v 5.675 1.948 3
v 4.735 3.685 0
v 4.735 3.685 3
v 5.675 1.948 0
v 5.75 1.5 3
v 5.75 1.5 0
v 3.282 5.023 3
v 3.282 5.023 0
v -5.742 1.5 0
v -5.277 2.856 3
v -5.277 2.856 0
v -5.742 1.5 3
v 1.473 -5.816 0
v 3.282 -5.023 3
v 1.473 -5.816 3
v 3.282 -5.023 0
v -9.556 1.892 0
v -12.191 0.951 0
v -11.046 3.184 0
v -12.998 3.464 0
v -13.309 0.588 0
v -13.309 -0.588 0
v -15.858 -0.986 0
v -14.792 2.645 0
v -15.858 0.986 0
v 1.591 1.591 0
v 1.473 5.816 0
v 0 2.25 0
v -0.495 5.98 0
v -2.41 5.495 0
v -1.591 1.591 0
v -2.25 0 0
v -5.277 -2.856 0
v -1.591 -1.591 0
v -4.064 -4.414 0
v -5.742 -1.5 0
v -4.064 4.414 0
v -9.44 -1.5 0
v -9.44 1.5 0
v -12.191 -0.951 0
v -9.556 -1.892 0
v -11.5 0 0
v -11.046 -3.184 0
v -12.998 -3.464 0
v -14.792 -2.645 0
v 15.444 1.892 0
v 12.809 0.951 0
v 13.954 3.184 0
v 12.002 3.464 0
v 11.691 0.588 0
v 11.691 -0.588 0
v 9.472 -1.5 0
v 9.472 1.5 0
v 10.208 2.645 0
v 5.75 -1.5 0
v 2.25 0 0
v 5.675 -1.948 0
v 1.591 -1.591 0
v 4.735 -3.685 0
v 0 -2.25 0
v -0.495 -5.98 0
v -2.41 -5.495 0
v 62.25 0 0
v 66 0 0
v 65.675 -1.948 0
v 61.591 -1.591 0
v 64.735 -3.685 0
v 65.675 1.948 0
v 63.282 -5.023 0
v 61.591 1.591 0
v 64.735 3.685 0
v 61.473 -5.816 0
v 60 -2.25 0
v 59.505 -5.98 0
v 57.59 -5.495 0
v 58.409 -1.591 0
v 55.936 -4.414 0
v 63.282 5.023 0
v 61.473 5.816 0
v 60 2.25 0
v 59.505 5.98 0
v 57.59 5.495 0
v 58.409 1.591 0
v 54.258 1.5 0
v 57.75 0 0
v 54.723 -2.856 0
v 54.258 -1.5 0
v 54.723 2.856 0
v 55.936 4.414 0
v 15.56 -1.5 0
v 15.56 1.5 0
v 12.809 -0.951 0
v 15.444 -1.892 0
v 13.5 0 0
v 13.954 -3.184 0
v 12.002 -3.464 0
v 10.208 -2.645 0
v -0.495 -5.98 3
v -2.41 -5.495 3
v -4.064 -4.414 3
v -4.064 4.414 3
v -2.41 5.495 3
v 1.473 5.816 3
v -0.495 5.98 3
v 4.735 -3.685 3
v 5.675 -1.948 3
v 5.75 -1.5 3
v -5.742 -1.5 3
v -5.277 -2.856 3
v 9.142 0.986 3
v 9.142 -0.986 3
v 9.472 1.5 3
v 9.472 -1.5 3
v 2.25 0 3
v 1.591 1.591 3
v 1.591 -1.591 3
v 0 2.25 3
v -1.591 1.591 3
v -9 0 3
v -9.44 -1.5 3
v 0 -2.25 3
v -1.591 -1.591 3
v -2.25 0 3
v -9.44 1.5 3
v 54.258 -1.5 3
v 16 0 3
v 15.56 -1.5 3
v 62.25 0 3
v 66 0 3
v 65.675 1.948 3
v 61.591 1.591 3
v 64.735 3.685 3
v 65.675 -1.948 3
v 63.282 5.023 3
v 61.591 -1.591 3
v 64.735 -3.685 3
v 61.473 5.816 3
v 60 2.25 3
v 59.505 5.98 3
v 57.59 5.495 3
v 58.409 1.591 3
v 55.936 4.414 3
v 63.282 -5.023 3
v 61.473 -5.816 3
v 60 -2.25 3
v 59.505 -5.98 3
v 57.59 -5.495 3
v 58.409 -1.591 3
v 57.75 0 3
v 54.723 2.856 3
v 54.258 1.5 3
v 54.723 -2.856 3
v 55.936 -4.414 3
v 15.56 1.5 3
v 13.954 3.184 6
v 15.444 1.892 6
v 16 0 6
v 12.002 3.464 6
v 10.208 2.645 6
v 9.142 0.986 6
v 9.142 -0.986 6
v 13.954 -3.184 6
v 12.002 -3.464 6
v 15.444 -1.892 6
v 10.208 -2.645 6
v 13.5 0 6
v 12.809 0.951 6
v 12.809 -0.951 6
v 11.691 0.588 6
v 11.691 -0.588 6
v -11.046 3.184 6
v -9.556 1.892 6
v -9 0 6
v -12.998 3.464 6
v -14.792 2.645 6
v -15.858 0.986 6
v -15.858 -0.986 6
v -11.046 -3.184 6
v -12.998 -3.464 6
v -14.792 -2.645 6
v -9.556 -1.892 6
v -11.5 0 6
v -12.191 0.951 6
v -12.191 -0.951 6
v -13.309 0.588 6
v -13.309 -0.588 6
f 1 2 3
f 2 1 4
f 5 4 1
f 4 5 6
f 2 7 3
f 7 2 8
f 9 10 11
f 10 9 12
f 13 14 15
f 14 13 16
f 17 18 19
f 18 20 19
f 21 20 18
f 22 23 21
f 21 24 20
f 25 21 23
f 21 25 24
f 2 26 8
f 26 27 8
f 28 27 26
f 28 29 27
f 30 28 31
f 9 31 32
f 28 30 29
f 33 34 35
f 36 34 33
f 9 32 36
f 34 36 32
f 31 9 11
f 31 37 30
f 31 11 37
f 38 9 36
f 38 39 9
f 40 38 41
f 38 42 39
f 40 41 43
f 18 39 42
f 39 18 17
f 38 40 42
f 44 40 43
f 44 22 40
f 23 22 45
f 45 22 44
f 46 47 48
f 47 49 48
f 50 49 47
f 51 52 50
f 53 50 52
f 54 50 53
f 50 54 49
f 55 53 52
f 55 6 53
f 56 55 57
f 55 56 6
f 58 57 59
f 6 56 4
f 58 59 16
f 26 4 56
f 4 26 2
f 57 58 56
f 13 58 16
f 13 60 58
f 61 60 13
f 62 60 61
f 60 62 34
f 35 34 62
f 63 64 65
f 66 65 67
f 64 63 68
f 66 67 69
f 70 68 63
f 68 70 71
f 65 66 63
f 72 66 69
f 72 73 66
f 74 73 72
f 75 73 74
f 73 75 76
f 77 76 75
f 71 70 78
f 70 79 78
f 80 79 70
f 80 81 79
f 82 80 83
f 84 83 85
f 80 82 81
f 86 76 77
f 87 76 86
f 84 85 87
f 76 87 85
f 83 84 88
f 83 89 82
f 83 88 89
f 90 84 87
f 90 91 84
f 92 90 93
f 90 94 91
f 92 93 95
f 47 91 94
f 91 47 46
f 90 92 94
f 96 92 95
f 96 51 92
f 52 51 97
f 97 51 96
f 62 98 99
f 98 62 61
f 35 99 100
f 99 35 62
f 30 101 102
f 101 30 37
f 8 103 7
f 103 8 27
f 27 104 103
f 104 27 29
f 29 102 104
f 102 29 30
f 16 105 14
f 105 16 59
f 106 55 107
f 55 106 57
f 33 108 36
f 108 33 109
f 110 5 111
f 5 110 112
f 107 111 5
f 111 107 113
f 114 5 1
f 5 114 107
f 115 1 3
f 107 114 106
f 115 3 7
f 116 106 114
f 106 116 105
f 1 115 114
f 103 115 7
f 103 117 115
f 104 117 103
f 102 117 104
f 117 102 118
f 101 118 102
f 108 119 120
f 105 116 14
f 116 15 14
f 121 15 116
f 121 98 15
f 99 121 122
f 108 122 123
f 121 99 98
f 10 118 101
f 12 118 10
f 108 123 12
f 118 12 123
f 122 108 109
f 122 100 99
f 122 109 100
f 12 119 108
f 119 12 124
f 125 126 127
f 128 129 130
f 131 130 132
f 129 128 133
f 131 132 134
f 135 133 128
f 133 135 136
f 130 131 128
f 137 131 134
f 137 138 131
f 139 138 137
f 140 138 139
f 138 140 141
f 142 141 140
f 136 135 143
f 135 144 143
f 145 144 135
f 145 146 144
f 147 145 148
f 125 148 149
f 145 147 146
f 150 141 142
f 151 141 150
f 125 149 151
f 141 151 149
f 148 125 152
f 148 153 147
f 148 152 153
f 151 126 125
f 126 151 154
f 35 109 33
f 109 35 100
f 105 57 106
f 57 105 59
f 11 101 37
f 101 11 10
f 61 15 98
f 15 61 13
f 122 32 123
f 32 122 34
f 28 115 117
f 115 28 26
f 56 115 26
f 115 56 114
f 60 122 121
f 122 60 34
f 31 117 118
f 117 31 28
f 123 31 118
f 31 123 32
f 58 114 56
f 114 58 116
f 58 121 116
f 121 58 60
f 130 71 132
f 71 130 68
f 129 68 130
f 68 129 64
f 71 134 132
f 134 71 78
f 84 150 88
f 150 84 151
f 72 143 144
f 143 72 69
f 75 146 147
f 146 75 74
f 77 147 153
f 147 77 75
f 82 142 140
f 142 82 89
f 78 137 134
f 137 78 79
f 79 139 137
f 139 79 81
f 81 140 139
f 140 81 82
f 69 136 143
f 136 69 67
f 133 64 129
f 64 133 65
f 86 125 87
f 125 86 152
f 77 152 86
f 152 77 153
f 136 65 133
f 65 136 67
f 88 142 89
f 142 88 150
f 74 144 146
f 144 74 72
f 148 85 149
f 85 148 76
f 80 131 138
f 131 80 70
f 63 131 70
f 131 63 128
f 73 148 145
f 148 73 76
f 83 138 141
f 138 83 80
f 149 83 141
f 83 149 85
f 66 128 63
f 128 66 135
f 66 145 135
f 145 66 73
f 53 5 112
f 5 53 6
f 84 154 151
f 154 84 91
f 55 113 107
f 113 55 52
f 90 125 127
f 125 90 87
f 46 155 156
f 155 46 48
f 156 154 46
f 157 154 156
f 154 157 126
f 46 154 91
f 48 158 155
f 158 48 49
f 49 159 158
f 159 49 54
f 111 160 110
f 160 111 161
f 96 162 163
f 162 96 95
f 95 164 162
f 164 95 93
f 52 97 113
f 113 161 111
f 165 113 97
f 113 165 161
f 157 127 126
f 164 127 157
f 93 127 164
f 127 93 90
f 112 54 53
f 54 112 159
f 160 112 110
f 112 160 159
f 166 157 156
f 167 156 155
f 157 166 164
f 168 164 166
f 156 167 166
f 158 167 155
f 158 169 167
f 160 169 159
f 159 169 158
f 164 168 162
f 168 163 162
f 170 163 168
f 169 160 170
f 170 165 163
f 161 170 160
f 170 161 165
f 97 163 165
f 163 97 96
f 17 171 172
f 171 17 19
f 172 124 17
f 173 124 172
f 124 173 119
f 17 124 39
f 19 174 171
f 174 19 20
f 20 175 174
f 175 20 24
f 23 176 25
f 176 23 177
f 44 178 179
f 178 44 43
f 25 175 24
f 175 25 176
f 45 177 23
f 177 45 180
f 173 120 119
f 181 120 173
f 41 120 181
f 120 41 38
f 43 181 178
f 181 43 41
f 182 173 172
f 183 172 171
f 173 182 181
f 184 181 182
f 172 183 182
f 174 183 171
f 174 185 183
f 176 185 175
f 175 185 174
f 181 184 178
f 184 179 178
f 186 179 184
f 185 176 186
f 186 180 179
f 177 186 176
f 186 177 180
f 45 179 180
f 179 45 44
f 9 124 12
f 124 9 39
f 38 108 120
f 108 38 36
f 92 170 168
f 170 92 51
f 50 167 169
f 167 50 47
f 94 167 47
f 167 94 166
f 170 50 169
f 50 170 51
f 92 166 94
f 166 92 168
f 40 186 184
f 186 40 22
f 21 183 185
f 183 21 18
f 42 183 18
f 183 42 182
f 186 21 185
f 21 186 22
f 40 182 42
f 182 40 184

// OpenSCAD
height = 3; //mm
squoojefactor = 1; //mm
screw = 3.5 + squoojefactor; //mm, ie a loose M3
wire = 1 + squoojefactor; //mm
thick = 3;//
servoarmlength = 25; //mm

length = 60;
servoheight = 3 + height; //mm


difference(){
union(){
joint();
translate([length,0,0]) joint();
translate([thick,-(thick/2),0]) cube([length-(2*thick), thick, height]);

translate([servoarmlength/2,0,0]) cylinder(h=servoheight, d=thick+(2*wire));
translate([-(servoarmlength/2),0,0]) cylinder(h=servoheight, d=thick+(2*wire));

//extra bit of arm
translate([-(thick+(screw/2)+servoarmlength/2-(2*thick)),-(thick/2),0]) cube([servoarmlength/2-(2*thick), thick, height]);
}

translate([servoarmlength/2,0,0]) cylinder(h=servoheight, d=wire);
translate([-(servoarmlength/2),0,0]) cylinder(h=servoheight, d=wire);
}



module joint(){
difference(){
	cylinder(h=height, d=thick + (2*screw));
	cylinder(h=height, d=screw);
	}
}
